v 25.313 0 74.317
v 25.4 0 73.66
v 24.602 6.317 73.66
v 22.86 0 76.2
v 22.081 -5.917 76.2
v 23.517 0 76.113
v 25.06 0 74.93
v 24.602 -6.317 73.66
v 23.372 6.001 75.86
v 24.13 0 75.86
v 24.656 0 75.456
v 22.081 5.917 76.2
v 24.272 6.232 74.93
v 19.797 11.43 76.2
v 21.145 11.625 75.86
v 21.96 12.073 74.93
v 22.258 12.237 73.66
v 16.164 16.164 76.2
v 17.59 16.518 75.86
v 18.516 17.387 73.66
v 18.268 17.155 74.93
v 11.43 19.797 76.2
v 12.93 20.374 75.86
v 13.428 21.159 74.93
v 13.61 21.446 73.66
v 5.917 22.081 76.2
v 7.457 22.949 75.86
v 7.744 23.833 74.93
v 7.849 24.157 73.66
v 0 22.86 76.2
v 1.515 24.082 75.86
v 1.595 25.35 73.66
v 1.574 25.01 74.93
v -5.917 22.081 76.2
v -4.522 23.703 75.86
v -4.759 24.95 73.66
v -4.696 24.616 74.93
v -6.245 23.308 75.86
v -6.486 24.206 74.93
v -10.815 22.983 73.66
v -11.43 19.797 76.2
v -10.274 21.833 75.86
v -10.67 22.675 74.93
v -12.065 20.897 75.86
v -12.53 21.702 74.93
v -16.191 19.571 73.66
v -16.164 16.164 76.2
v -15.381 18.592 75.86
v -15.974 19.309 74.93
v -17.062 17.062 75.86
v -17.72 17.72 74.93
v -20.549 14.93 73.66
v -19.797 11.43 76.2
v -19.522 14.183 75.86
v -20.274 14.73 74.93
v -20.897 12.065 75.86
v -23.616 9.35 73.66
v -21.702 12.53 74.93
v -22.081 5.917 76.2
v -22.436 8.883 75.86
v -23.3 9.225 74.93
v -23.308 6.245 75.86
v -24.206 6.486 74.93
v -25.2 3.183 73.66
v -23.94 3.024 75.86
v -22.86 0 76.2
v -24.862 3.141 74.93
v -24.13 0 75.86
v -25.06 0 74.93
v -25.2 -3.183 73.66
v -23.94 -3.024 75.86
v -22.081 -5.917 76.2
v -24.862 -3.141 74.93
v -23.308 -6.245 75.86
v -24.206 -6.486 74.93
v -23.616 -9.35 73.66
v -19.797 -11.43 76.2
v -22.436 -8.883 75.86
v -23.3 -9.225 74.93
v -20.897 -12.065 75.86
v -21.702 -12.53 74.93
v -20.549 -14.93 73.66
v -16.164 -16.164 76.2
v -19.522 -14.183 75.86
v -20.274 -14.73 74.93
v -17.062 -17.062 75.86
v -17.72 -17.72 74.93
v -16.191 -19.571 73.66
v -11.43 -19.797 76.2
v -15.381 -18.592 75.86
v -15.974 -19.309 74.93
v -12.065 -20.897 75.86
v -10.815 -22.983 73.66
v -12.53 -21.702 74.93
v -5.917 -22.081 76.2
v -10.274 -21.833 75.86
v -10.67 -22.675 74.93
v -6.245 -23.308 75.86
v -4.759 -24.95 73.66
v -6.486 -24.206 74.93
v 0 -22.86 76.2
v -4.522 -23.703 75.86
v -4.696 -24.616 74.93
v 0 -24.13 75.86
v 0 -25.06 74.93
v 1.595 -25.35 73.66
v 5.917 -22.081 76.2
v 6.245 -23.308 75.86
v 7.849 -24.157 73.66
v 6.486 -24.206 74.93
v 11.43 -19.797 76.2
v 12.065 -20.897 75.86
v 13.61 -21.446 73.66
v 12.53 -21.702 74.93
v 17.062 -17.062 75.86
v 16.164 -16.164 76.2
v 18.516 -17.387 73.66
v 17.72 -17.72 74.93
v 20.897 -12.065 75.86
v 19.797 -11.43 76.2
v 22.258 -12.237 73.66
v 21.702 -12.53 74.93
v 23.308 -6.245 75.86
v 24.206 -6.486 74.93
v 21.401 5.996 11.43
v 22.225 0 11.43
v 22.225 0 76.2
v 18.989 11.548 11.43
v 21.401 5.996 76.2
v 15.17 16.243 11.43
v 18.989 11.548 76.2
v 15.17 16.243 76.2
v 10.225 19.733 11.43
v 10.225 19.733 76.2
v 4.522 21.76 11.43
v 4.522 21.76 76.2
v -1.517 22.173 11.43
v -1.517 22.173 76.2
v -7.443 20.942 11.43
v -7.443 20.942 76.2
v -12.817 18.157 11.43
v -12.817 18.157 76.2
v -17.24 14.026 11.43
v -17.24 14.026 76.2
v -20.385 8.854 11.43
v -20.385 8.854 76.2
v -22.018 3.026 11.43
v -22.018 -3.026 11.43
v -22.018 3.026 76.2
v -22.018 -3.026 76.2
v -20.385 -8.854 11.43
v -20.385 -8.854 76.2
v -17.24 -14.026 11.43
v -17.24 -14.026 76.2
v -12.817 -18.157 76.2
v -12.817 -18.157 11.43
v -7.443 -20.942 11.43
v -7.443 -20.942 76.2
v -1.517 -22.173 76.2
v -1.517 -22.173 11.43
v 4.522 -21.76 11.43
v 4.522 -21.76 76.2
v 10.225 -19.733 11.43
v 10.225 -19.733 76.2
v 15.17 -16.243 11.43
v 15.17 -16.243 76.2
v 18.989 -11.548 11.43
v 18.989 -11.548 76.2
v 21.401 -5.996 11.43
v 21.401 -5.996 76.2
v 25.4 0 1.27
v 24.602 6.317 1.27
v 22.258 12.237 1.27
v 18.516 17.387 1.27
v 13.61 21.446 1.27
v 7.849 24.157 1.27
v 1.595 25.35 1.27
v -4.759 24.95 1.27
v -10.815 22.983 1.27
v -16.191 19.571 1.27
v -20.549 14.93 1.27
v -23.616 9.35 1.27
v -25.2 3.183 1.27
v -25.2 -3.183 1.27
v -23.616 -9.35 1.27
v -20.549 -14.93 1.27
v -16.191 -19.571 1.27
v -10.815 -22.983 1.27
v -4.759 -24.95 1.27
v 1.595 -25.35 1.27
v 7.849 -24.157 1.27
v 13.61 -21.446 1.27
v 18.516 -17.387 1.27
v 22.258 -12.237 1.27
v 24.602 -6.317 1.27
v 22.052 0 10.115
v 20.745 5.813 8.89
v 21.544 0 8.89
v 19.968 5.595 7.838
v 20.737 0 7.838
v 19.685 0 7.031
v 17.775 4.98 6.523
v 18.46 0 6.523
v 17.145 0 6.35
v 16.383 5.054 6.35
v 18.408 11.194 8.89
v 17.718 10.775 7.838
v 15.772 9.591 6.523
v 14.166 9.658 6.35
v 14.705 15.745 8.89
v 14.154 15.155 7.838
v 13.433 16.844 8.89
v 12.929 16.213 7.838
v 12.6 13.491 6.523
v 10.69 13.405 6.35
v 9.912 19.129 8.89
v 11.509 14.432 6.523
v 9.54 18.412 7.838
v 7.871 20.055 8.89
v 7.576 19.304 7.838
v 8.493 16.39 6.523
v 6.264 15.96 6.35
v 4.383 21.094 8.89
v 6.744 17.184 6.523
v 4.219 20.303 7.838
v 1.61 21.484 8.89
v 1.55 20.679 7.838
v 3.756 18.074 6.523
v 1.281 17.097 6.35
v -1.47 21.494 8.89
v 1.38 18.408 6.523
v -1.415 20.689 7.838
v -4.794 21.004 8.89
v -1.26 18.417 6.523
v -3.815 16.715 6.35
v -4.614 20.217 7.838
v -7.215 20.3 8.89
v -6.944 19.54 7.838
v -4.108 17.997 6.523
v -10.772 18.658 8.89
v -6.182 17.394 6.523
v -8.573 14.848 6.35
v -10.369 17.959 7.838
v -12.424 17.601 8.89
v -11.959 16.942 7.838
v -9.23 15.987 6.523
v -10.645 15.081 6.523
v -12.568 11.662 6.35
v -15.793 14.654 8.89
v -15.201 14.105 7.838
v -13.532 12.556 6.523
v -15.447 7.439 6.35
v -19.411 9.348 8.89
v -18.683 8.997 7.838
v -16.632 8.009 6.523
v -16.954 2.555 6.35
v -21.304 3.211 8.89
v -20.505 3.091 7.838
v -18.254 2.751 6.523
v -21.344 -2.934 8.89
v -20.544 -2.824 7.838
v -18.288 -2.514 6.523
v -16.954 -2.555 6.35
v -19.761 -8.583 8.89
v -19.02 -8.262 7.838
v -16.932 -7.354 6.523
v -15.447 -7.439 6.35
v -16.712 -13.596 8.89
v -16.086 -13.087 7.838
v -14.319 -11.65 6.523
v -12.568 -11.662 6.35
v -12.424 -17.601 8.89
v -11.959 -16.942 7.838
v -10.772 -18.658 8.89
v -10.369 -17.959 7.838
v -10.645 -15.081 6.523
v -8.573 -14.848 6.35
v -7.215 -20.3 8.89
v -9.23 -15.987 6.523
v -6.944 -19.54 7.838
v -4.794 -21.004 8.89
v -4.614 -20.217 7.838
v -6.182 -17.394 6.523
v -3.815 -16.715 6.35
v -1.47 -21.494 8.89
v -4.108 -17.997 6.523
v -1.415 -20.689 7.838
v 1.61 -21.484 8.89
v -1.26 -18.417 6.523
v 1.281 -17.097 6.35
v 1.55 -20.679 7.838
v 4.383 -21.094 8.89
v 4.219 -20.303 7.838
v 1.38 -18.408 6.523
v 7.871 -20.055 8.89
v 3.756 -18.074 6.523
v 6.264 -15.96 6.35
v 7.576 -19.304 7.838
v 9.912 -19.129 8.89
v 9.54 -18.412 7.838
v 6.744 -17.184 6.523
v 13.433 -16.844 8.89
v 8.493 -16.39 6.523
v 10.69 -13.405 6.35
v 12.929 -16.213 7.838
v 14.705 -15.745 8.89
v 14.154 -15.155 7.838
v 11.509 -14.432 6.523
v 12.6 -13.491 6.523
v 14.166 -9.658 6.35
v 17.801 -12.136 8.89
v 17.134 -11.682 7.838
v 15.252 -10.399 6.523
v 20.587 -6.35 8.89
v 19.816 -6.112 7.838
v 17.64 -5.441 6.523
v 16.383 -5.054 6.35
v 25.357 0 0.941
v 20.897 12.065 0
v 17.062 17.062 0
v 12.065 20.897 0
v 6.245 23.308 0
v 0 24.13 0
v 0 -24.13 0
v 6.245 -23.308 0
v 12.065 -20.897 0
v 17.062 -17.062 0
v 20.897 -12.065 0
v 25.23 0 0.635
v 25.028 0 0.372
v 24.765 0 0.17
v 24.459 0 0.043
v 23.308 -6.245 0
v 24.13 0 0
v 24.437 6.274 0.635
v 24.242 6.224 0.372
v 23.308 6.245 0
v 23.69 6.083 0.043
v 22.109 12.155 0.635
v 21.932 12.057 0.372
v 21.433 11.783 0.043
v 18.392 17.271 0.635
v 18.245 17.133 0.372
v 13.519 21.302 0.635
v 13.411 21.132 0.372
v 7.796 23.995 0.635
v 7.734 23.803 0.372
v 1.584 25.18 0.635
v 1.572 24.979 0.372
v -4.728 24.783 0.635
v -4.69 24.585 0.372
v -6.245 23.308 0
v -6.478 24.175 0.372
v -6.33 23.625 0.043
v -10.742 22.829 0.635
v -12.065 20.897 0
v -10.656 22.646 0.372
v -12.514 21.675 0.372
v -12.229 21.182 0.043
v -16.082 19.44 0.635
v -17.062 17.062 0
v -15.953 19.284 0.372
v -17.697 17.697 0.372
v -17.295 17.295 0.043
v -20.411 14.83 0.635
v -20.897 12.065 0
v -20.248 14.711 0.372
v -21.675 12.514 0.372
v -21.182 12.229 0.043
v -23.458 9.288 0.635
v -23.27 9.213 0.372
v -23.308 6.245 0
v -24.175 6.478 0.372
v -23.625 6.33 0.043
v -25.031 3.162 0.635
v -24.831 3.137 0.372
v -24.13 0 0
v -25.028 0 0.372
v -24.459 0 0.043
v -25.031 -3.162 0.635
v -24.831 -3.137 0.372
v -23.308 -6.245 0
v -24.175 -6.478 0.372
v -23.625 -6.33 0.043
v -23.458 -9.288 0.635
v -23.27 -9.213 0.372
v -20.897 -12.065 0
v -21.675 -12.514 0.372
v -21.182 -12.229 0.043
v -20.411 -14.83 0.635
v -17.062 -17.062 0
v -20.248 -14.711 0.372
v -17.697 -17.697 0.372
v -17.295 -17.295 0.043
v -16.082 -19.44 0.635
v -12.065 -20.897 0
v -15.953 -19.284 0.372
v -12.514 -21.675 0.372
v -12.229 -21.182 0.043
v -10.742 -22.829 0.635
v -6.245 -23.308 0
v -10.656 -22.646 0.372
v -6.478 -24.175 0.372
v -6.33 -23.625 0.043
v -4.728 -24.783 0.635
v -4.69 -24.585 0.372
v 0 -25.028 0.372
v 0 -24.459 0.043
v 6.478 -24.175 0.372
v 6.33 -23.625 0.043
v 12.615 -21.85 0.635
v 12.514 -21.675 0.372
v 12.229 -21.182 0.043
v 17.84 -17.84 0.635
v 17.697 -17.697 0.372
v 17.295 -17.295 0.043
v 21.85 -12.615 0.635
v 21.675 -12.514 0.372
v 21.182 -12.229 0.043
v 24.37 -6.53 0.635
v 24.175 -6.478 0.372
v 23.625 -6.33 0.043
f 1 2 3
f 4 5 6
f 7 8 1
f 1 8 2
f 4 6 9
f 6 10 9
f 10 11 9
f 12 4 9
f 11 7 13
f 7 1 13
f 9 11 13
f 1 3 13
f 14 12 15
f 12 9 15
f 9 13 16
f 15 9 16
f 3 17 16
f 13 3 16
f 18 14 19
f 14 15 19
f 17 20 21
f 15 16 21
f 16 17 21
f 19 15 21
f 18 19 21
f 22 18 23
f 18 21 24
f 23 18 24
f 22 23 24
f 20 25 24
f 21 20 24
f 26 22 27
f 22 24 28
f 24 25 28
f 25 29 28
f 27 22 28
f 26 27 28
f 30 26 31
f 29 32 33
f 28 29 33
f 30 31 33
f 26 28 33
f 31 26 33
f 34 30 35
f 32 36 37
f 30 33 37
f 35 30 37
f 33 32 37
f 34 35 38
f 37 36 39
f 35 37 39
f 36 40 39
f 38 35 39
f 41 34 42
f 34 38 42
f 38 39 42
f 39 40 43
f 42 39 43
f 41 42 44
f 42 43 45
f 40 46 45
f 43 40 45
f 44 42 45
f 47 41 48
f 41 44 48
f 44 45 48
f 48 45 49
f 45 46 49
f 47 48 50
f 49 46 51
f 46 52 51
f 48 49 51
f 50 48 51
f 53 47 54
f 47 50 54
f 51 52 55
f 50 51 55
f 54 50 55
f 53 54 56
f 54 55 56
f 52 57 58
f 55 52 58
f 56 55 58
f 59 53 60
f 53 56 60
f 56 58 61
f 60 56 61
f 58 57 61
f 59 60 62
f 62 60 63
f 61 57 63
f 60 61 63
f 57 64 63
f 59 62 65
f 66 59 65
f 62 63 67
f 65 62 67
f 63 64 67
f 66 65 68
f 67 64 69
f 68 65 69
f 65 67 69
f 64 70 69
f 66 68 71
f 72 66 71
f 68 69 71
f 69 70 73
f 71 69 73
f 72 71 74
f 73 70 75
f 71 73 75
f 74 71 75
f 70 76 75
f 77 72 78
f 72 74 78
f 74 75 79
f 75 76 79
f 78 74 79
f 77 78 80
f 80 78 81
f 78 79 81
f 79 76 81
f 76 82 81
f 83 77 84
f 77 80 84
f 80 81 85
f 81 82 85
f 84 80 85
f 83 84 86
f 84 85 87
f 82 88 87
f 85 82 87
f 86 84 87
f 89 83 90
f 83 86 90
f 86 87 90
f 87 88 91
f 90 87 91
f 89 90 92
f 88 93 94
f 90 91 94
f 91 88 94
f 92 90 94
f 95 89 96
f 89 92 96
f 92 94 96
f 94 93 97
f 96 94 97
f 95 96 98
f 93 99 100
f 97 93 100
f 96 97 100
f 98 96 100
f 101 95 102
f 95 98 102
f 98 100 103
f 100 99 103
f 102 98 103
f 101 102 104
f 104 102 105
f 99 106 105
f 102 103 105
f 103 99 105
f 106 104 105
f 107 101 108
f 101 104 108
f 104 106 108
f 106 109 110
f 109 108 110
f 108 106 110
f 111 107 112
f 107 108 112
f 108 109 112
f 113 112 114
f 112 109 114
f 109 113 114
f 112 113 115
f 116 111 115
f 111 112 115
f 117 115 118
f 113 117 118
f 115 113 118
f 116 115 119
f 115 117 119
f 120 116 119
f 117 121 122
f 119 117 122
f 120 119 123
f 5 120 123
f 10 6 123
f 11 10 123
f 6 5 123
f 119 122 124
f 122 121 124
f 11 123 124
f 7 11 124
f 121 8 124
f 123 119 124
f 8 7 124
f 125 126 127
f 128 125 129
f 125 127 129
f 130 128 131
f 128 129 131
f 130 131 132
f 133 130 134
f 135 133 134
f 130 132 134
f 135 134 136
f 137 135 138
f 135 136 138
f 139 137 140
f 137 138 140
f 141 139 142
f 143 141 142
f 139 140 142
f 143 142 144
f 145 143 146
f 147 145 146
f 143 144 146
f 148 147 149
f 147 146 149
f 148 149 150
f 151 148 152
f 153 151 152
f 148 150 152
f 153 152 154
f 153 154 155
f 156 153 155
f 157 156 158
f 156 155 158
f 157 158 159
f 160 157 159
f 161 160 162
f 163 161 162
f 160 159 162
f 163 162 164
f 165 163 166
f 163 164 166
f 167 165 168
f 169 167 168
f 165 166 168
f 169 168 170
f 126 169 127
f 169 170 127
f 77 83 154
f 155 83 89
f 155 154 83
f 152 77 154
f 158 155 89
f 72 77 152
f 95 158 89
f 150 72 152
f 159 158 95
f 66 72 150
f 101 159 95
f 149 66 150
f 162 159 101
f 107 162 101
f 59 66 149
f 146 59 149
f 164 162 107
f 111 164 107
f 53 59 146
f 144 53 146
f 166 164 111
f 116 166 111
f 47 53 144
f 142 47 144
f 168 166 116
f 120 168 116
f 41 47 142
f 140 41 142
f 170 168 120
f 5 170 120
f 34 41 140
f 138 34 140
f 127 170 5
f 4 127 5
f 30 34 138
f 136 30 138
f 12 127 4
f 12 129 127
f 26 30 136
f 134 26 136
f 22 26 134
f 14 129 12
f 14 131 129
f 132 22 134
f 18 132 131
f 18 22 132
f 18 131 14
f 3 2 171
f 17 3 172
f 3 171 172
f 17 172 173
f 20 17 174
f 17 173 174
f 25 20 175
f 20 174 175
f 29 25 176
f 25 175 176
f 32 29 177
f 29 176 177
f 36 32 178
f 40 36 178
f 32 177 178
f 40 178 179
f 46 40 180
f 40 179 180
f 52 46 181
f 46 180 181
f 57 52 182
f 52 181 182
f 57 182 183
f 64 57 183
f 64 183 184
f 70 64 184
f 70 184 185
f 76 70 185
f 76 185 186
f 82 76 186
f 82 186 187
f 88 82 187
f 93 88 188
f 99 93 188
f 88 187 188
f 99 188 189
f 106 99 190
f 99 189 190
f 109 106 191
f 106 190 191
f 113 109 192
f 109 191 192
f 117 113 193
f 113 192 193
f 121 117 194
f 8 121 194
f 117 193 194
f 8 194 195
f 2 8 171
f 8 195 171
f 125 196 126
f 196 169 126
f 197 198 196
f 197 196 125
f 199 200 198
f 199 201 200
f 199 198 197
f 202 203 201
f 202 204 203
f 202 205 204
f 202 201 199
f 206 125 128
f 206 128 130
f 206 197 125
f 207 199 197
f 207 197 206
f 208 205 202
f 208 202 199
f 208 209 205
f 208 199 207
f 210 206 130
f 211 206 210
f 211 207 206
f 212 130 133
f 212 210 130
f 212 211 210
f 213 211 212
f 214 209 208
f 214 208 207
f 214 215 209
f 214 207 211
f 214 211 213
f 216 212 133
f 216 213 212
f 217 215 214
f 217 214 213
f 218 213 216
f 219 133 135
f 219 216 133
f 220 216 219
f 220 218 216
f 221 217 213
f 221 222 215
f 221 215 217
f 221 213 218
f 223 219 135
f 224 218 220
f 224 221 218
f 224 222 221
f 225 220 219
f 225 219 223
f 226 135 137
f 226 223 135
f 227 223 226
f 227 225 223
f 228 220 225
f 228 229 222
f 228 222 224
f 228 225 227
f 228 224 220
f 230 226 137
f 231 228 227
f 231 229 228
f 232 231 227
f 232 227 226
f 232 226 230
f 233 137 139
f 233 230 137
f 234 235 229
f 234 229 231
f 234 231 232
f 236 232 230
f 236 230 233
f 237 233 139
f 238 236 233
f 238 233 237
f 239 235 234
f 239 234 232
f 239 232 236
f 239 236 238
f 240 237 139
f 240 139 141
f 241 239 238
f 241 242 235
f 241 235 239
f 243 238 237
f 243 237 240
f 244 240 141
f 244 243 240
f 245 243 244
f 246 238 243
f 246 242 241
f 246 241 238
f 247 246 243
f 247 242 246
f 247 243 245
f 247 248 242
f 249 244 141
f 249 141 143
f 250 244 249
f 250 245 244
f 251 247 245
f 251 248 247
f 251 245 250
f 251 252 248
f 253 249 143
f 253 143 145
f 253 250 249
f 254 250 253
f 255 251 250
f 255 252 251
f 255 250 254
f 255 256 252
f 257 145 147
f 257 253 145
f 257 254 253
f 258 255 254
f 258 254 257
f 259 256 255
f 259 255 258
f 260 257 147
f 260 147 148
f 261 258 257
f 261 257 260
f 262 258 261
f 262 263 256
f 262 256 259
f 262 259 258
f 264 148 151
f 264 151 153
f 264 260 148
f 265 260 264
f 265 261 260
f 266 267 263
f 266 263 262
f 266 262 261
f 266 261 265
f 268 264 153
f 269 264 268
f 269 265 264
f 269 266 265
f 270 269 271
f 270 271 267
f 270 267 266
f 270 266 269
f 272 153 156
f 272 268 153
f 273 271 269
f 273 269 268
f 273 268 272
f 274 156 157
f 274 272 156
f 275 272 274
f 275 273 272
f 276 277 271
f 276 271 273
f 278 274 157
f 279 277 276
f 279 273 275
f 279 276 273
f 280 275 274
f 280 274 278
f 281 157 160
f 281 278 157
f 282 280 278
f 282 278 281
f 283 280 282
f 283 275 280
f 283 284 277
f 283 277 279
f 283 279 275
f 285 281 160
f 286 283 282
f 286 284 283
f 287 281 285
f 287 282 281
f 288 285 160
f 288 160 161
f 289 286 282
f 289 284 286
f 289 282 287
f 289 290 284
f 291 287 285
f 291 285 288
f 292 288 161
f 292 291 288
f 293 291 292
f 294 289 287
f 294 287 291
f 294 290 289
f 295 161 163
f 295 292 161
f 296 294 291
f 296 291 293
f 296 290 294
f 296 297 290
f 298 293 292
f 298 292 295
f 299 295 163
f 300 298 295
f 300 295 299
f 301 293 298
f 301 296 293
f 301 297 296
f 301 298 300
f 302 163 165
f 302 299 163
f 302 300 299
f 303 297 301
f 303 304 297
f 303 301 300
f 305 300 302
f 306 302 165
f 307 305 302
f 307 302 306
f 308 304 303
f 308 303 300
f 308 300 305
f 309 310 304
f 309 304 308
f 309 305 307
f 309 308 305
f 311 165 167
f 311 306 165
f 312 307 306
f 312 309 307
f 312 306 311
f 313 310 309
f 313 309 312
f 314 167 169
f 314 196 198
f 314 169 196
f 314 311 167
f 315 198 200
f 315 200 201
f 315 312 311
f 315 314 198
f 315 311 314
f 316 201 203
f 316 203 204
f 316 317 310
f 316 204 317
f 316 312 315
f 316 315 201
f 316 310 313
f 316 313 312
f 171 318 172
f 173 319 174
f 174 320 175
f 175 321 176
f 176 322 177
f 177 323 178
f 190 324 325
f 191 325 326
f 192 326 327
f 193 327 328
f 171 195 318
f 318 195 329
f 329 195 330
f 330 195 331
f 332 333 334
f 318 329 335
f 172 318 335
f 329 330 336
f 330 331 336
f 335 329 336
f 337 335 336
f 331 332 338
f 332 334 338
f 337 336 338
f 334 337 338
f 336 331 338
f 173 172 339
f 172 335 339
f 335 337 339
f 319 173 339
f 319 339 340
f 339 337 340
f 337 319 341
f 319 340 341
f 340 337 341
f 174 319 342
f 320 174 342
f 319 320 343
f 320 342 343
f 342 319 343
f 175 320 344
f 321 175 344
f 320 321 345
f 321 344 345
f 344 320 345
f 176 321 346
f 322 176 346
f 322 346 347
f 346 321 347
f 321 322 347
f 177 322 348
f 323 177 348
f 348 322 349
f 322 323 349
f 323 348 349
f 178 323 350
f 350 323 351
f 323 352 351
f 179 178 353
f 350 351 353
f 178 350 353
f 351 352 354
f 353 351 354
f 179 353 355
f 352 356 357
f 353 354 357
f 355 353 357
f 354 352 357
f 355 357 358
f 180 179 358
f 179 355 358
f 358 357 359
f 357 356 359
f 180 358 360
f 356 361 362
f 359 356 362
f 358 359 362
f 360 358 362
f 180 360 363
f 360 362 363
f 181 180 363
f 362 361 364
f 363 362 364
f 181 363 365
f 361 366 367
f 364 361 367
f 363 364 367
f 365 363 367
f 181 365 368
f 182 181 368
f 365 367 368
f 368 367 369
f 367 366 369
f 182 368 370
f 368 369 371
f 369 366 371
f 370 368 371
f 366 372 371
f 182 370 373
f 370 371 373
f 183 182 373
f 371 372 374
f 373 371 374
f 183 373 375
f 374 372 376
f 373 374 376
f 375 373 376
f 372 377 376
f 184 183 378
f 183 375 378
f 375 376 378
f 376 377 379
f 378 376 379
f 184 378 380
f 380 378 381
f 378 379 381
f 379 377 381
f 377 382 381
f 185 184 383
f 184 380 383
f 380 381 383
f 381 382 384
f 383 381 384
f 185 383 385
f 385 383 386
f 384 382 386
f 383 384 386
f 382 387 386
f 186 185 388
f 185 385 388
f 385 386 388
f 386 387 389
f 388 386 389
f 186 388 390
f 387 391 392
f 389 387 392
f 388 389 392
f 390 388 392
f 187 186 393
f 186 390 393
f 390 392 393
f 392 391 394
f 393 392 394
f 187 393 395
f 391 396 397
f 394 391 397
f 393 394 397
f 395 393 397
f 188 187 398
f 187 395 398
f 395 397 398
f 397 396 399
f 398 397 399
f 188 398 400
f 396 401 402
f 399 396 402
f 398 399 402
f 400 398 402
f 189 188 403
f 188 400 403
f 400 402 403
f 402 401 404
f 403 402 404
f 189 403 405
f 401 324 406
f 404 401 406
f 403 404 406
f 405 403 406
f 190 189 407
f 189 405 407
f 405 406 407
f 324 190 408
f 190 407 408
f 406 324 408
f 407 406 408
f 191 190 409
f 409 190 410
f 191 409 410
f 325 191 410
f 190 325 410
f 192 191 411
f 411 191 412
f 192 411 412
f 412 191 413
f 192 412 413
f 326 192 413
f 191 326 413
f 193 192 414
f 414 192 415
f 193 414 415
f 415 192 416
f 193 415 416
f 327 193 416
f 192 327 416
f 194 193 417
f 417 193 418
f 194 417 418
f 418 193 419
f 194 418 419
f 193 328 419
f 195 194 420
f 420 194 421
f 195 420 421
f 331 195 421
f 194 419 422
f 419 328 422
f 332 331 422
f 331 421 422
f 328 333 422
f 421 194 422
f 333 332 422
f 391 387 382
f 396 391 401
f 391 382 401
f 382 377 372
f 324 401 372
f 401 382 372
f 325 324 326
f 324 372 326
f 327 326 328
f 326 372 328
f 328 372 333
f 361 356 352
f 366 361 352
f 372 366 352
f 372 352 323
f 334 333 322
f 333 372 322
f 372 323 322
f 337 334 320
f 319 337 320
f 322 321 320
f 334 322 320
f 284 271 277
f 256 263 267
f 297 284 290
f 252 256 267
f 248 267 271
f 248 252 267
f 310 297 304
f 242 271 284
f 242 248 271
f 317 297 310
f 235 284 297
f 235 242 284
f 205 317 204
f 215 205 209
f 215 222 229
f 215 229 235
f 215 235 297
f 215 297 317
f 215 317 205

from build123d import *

# Parameters (mm, degrees)
F0_R     = 25.4
F1_DEPTH = 76.2
F2_R     = 22.225
F3_DEPTH = 69.85
F4_R     = 5.08
F5_R     = 2.54
F6_R     = 1.27


with BuildPart() as f1:
    # F0 (on Top) → F1 (new body)
    with BuildSketch(Plane.XY):
        Circle(F0_R)
    extrude(amount=F1_DEPTH)

    # F2 (on face) → F3 (cut)
    with BuildSketch(Plane.XY.offset(76.2)):
        Circle(F2_R)
    extrude(amount=-F3_DEPTH, mode=Mode.SUBTRACT)

    # F4
    f4_edges = [f1.edges().sort_by_distance(p)[0] for p in [
        (-22.225, 0, 6.35),
    ]]
    fillet(f4_edges, radius=F4_R)

    # F5
    f5_edges = [f1.edges().sort_by_distance(p)[0] for p in [
        (-25.4, 0, 76.2),
    ]]
    fillet(f5_edges, radius=F5_R)

    # F6
    f6_edges = [f1.edges().sort_by_distance(p)[0] for p in [
        (-25.4, 0, 0),
    ]]
    fillet(f6_edges, radius=F6_R)


solid = f1.part
